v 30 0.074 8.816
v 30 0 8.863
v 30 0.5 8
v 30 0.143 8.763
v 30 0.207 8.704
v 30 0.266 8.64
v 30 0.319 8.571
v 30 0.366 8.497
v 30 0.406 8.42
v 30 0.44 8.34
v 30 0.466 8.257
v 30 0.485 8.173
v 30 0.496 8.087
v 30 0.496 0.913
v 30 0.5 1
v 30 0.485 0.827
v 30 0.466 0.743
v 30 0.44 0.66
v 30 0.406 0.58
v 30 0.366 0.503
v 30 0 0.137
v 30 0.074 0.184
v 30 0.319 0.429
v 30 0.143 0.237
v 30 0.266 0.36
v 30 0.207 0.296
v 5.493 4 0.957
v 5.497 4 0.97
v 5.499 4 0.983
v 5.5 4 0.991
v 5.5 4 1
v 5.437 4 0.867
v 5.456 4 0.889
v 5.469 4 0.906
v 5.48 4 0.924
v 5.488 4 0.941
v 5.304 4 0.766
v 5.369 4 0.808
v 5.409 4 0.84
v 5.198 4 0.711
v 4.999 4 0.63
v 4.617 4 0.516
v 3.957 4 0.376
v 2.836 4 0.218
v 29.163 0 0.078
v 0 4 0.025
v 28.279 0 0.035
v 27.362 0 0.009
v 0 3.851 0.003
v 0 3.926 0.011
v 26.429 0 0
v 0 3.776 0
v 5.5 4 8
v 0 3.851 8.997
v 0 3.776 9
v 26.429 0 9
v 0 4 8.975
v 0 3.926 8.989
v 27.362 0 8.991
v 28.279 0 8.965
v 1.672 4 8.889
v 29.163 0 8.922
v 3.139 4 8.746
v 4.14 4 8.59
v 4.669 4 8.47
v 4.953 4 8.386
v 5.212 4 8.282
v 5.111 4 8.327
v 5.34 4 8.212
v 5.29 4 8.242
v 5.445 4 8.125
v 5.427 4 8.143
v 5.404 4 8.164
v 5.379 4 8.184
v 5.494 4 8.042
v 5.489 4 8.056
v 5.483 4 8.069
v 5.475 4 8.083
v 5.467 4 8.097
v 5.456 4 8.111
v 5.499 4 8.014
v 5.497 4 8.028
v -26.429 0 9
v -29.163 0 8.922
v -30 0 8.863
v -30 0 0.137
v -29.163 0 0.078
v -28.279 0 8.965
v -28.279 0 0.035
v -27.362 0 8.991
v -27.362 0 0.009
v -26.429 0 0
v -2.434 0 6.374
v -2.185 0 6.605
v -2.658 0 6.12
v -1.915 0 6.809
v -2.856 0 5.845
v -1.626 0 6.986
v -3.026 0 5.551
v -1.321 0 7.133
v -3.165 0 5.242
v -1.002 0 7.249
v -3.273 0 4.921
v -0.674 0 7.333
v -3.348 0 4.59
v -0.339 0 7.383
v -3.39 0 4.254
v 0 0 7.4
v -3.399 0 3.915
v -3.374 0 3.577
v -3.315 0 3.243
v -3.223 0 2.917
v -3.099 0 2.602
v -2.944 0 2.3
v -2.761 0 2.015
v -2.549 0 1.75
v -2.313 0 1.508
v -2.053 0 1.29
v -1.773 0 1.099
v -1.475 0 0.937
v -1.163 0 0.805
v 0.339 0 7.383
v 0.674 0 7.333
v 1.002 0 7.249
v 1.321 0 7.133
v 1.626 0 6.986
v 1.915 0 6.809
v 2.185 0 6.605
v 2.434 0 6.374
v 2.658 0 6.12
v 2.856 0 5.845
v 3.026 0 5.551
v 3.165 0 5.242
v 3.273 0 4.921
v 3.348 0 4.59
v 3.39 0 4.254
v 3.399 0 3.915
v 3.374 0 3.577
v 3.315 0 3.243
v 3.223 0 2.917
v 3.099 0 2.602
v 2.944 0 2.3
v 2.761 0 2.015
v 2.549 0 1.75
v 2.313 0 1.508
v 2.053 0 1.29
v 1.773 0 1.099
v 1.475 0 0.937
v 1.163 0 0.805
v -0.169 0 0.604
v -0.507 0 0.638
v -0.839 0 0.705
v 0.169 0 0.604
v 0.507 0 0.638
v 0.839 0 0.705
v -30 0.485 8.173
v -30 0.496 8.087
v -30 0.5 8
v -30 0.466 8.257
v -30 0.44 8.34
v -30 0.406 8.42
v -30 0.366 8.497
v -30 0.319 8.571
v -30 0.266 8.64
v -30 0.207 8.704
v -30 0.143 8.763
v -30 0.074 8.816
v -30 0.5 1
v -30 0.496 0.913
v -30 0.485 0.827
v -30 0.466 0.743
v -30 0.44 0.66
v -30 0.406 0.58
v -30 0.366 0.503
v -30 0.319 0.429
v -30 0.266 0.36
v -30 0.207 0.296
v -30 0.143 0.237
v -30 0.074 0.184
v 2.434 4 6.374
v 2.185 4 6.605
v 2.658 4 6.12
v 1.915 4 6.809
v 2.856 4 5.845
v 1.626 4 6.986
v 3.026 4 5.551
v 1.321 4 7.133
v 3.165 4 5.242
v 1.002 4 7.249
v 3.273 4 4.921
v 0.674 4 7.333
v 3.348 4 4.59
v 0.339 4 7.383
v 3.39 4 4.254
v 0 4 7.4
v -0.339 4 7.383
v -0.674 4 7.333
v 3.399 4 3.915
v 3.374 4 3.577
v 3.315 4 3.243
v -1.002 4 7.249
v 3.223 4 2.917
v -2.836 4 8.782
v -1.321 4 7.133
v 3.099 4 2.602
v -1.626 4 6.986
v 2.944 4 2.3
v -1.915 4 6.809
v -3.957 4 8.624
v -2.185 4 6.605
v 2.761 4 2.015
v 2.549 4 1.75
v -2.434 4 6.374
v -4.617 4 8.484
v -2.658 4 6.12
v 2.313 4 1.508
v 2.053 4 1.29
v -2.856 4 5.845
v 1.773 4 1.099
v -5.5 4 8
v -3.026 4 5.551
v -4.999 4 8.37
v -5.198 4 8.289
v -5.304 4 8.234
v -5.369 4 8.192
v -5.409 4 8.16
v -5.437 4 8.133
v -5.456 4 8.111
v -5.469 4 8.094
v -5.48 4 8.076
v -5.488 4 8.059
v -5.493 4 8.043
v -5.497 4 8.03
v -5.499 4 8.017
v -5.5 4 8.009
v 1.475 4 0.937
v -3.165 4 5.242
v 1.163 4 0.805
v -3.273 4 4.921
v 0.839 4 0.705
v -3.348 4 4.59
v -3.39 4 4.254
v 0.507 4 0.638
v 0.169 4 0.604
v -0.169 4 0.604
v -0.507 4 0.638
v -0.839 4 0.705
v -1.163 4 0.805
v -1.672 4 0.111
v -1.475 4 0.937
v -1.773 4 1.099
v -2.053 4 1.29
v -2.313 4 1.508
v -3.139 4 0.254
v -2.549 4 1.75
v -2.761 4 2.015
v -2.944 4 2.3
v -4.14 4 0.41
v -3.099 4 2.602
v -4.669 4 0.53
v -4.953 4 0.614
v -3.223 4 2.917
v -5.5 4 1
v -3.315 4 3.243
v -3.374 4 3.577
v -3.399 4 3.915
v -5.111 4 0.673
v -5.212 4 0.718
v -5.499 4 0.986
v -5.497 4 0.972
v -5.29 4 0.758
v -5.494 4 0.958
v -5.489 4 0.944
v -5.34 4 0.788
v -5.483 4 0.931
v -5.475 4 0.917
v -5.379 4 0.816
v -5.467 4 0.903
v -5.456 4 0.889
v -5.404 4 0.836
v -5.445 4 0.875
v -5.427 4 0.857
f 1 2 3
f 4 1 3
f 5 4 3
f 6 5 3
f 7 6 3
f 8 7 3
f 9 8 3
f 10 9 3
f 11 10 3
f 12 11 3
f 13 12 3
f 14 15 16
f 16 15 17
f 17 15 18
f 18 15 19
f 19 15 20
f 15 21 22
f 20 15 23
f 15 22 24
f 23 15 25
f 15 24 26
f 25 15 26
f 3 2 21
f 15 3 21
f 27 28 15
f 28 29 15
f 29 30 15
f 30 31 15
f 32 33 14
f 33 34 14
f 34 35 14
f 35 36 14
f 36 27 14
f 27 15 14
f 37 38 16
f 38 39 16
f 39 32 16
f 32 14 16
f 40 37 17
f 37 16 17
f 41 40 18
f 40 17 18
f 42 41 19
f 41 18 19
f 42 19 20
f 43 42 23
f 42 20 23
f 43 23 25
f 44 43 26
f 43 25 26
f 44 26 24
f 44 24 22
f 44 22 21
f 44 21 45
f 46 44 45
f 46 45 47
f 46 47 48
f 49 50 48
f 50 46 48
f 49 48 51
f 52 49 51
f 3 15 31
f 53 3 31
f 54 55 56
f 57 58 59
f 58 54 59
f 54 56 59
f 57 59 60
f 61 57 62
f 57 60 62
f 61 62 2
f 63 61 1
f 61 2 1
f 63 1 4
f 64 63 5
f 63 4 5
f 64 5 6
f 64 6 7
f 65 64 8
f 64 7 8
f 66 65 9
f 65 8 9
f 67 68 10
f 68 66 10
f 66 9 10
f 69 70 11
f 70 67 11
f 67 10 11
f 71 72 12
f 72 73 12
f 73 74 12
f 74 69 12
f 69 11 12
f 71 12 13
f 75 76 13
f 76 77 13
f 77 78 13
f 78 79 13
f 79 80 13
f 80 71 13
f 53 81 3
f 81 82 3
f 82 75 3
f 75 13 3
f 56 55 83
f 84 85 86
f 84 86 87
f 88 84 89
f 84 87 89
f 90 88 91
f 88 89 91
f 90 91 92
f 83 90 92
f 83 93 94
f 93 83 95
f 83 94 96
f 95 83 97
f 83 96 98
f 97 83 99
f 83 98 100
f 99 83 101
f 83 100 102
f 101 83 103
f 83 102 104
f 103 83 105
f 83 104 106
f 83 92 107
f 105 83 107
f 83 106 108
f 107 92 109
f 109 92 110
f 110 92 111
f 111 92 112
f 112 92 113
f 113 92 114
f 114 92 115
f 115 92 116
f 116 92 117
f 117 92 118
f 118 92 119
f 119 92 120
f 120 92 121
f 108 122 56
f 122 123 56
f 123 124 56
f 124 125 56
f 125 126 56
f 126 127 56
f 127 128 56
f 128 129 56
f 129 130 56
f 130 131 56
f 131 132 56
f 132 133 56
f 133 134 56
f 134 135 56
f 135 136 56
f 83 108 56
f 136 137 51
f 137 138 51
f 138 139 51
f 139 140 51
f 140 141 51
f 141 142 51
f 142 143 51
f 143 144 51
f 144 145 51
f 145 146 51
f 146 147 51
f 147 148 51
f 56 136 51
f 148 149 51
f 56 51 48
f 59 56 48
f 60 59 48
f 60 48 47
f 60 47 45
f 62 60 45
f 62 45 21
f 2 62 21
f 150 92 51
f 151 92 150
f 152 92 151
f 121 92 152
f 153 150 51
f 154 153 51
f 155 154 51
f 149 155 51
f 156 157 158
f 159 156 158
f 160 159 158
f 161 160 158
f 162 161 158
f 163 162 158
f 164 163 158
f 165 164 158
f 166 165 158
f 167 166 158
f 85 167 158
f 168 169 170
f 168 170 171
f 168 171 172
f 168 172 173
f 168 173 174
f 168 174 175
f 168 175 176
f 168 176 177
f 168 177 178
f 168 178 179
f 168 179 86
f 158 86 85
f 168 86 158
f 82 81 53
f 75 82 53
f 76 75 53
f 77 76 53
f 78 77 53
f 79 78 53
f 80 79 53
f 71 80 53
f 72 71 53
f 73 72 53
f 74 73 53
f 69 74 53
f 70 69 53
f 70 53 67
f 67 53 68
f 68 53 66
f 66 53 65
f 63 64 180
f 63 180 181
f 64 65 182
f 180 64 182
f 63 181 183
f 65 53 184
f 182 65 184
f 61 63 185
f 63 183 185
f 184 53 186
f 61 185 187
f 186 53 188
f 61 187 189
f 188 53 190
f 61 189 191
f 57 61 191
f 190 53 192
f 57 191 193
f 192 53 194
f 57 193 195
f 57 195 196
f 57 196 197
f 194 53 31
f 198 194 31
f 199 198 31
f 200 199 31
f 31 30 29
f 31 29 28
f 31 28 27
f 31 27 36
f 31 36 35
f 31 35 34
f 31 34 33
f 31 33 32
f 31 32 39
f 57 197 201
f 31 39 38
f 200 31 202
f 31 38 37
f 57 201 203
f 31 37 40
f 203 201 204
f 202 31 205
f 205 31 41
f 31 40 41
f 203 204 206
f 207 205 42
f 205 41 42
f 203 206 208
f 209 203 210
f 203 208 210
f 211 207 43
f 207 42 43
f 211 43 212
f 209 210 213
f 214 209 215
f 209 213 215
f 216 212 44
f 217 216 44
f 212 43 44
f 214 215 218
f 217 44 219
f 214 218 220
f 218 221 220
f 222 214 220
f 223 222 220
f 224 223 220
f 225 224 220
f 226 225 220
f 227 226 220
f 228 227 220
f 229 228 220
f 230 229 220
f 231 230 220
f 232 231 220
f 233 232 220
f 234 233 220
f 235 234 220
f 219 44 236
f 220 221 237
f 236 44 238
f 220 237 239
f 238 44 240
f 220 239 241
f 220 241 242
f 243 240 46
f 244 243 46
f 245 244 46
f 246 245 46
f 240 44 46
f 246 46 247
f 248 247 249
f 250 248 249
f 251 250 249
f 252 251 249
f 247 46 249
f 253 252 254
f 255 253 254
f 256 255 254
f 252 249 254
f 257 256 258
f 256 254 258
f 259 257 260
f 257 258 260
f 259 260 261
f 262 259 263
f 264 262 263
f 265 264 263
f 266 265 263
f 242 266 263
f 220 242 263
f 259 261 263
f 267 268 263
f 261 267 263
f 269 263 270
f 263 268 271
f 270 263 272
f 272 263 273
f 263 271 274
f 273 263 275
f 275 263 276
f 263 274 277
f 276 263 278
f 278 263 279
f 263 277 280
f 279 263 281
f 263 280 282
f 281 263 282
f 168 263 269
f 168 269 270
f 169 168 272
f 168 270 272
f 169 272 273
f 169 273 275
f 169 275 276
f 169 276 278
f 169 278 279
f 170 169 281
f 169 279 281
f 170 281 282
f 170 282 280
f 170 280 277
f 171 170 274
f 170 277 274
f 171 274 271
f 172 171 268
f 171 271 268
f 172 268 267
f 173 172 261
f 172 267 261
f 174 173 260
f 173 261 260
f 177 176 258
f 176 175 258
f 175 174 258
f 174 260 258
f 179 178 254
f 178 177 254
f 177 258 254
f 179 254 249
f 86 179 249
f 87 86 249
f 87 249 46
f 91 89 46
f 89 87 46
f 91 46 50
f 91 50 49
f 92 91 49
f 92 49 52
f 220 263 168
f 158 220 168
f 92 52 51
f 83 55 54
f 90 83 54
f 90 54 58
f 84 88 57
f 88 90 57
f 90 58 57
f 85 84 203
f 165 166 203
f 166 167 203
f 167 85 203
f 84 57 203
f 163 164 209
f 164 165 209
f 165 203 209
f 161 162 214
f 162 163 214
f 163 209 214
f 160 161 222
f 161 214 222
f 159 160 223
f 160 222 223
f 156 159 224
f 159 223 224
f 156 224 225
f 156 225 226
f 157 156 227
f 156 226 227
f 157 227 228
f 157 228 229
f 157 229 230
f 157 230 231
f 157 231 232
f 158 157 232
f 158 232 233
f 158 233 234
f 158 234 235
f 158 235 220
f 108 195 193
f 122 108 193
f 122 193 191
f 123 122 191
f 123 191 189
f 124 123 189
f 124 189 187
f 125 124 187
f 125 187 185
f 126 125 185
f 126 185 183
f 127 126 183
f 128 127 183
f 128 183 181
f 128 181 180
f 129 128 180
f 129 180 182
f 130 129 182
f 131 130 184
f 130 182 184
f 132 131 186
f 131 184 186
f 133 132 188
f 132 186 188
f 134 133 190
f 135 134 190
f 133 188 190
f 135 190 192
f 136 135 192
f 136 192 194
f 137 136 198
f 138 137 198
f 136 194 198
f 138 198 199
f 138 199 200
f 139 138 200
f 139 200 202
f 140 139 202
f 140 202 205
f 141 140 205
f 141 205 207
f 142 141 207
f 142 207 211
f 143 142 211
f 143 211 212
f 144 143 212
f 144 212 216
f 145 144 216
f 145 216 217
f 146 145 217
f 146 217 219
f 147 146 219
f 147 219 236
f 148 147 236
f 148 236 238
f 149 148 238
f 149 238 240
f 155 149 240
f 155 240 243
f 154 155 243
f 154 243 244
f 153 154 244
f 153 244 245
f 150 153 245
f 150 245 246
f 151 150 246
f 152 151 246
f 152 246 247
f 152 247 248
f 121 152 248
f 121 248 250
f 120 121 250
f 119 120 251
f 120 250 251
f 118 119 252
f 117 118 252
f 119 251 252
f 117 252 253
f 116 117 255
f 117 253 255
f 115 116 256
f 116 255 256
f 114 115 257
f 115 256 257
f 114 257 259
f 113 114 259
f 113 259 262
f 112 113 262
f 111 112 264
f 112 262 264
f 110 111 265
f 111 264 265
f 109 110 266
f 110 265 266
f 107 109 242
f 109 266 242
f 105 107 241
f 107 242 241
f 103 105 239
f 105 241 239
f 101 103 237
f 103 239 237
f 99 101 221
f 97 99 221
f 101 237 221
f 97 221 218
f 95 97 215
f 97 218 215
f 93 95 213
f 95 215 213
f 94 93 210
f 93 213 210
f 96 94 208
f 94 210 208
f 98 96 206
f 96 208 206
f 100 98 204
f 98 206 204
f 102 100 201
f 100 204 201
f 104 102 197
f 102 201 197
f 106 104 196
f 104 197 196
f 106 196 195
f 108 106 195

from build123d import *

# Parameters (mm, degrees)
BOSS_EXTRUDE1_DEPTH = 9
SKETCH2_R           = 3.4
CUT_EXTRUDE1_DEPTH  = 32.575306808
FILLET1_R           = 1


with BuildPart() as part:
    # Sketch1 → Boss-Extrude1 (new body)
    with BuildSketch(Plane.XY):
        Polygon((-30, 0), (30, 0), (30, 0.5), (5.5, 4), (-5.5, 4), (-30, 0.5), align=None)
    extrude(amount=BOSS_EXTRUDE1_DEPTH)

    # Sketch2 → Cut-Extrude1 (cut, through all)
    with BuildSketch(Plane(origin=(0, 4, 0), x_dir=(1, 0, 0), z_dir=(0, 1, 0))):
        with Locations(Location((0, -4, 0), (0, 0, 270))):
            Circle(SKETCH2_R)
    extrude(amount=-CUT_EXTRUDE1_DEPTH, mode=Mode.SUBTRACT)

    # Fillet1
    # the kernel refuses this fillet: 1 mm, written as the material it takes off along each edge
    with BuildSketch(Plane(origin=(0.439696962, 4.848528137, 9), x_dir=(0.1414213562373095, -0.9899494936611666, 0), z_dir=(-0.9899494936611666, -0.1414213562373095, 0)), Plane(origin=(35.939696962, -0.348528137, 9), x_dir=(-0.14142135623730948, -0.9899494936611666, 0), z_dir=(-0.9899494936611666, 0.1414213562373095, 0))) as fillet1_piece_1:
        with BuildLine():
            CenterArc((FILLET1_R, -FILLET1_R), FILLET1_R, 90, 90)
            Line((0, -FILLET1_R), (-FILLET1_R * 0.02, -FILLET1_R))
            Line((-FILLET1_R * 0.02, -FILLET1_R), (-FILLET1_R * 0.02, FILLET1_R * 0.02))
            Line((-FILLET1_R * 0.02, FILLET1_R * 0.02), (FILLET1_R, FILLET1_R * 0.02))
            Line((FILLET1_R, FILLET1_R * 0.02), (FILLET1_R, 0))
        make_face()
    extrude(amount=36.748737342, mode=Mode.SUBTRACT)
    with BuildSketch(Plane(origin=(0.439696962, 4.848528137, 0), x_dir=(0.1414213562373095, -0.9899494936611666, 0), z_dir=(-0.9899494936611666, -0.1414213562373095, 0)), Plane(origin=(35.939696962, -0.348528137, 0), x_dir=(-0.14142135623730948, -0.9899494936611666, 0), z_dir=(-0.9899494936611666, 0.1414213562373095, 0))) as fillet1_piece_2:
        with BuildLine():
            CenterArc((FILLET1_R, FILLET1_R), FILLET1_R, 180, 90)
            Line((0, FILLET1_R), (-FILLET1_R * 0.02, FILLET1_R))
            Line((-FILLET1_R * 0.02, FILLET1_R), (-FILLET1_R * 0.02, -FILLET1_R * 0.02))
            Line((-FILLET1_R * 0.02, -FILLET1_R * 0.02), (FILLET1_R, -FILLET1_R * 0.02))
            Line((FILLET1_R, -FILLET1_R * 0.02), (FILLET1_R, 0))
        make_face()
    extrude(amount=36.748737342, mode=Mode.SUBTRACT)


solid = part.part
